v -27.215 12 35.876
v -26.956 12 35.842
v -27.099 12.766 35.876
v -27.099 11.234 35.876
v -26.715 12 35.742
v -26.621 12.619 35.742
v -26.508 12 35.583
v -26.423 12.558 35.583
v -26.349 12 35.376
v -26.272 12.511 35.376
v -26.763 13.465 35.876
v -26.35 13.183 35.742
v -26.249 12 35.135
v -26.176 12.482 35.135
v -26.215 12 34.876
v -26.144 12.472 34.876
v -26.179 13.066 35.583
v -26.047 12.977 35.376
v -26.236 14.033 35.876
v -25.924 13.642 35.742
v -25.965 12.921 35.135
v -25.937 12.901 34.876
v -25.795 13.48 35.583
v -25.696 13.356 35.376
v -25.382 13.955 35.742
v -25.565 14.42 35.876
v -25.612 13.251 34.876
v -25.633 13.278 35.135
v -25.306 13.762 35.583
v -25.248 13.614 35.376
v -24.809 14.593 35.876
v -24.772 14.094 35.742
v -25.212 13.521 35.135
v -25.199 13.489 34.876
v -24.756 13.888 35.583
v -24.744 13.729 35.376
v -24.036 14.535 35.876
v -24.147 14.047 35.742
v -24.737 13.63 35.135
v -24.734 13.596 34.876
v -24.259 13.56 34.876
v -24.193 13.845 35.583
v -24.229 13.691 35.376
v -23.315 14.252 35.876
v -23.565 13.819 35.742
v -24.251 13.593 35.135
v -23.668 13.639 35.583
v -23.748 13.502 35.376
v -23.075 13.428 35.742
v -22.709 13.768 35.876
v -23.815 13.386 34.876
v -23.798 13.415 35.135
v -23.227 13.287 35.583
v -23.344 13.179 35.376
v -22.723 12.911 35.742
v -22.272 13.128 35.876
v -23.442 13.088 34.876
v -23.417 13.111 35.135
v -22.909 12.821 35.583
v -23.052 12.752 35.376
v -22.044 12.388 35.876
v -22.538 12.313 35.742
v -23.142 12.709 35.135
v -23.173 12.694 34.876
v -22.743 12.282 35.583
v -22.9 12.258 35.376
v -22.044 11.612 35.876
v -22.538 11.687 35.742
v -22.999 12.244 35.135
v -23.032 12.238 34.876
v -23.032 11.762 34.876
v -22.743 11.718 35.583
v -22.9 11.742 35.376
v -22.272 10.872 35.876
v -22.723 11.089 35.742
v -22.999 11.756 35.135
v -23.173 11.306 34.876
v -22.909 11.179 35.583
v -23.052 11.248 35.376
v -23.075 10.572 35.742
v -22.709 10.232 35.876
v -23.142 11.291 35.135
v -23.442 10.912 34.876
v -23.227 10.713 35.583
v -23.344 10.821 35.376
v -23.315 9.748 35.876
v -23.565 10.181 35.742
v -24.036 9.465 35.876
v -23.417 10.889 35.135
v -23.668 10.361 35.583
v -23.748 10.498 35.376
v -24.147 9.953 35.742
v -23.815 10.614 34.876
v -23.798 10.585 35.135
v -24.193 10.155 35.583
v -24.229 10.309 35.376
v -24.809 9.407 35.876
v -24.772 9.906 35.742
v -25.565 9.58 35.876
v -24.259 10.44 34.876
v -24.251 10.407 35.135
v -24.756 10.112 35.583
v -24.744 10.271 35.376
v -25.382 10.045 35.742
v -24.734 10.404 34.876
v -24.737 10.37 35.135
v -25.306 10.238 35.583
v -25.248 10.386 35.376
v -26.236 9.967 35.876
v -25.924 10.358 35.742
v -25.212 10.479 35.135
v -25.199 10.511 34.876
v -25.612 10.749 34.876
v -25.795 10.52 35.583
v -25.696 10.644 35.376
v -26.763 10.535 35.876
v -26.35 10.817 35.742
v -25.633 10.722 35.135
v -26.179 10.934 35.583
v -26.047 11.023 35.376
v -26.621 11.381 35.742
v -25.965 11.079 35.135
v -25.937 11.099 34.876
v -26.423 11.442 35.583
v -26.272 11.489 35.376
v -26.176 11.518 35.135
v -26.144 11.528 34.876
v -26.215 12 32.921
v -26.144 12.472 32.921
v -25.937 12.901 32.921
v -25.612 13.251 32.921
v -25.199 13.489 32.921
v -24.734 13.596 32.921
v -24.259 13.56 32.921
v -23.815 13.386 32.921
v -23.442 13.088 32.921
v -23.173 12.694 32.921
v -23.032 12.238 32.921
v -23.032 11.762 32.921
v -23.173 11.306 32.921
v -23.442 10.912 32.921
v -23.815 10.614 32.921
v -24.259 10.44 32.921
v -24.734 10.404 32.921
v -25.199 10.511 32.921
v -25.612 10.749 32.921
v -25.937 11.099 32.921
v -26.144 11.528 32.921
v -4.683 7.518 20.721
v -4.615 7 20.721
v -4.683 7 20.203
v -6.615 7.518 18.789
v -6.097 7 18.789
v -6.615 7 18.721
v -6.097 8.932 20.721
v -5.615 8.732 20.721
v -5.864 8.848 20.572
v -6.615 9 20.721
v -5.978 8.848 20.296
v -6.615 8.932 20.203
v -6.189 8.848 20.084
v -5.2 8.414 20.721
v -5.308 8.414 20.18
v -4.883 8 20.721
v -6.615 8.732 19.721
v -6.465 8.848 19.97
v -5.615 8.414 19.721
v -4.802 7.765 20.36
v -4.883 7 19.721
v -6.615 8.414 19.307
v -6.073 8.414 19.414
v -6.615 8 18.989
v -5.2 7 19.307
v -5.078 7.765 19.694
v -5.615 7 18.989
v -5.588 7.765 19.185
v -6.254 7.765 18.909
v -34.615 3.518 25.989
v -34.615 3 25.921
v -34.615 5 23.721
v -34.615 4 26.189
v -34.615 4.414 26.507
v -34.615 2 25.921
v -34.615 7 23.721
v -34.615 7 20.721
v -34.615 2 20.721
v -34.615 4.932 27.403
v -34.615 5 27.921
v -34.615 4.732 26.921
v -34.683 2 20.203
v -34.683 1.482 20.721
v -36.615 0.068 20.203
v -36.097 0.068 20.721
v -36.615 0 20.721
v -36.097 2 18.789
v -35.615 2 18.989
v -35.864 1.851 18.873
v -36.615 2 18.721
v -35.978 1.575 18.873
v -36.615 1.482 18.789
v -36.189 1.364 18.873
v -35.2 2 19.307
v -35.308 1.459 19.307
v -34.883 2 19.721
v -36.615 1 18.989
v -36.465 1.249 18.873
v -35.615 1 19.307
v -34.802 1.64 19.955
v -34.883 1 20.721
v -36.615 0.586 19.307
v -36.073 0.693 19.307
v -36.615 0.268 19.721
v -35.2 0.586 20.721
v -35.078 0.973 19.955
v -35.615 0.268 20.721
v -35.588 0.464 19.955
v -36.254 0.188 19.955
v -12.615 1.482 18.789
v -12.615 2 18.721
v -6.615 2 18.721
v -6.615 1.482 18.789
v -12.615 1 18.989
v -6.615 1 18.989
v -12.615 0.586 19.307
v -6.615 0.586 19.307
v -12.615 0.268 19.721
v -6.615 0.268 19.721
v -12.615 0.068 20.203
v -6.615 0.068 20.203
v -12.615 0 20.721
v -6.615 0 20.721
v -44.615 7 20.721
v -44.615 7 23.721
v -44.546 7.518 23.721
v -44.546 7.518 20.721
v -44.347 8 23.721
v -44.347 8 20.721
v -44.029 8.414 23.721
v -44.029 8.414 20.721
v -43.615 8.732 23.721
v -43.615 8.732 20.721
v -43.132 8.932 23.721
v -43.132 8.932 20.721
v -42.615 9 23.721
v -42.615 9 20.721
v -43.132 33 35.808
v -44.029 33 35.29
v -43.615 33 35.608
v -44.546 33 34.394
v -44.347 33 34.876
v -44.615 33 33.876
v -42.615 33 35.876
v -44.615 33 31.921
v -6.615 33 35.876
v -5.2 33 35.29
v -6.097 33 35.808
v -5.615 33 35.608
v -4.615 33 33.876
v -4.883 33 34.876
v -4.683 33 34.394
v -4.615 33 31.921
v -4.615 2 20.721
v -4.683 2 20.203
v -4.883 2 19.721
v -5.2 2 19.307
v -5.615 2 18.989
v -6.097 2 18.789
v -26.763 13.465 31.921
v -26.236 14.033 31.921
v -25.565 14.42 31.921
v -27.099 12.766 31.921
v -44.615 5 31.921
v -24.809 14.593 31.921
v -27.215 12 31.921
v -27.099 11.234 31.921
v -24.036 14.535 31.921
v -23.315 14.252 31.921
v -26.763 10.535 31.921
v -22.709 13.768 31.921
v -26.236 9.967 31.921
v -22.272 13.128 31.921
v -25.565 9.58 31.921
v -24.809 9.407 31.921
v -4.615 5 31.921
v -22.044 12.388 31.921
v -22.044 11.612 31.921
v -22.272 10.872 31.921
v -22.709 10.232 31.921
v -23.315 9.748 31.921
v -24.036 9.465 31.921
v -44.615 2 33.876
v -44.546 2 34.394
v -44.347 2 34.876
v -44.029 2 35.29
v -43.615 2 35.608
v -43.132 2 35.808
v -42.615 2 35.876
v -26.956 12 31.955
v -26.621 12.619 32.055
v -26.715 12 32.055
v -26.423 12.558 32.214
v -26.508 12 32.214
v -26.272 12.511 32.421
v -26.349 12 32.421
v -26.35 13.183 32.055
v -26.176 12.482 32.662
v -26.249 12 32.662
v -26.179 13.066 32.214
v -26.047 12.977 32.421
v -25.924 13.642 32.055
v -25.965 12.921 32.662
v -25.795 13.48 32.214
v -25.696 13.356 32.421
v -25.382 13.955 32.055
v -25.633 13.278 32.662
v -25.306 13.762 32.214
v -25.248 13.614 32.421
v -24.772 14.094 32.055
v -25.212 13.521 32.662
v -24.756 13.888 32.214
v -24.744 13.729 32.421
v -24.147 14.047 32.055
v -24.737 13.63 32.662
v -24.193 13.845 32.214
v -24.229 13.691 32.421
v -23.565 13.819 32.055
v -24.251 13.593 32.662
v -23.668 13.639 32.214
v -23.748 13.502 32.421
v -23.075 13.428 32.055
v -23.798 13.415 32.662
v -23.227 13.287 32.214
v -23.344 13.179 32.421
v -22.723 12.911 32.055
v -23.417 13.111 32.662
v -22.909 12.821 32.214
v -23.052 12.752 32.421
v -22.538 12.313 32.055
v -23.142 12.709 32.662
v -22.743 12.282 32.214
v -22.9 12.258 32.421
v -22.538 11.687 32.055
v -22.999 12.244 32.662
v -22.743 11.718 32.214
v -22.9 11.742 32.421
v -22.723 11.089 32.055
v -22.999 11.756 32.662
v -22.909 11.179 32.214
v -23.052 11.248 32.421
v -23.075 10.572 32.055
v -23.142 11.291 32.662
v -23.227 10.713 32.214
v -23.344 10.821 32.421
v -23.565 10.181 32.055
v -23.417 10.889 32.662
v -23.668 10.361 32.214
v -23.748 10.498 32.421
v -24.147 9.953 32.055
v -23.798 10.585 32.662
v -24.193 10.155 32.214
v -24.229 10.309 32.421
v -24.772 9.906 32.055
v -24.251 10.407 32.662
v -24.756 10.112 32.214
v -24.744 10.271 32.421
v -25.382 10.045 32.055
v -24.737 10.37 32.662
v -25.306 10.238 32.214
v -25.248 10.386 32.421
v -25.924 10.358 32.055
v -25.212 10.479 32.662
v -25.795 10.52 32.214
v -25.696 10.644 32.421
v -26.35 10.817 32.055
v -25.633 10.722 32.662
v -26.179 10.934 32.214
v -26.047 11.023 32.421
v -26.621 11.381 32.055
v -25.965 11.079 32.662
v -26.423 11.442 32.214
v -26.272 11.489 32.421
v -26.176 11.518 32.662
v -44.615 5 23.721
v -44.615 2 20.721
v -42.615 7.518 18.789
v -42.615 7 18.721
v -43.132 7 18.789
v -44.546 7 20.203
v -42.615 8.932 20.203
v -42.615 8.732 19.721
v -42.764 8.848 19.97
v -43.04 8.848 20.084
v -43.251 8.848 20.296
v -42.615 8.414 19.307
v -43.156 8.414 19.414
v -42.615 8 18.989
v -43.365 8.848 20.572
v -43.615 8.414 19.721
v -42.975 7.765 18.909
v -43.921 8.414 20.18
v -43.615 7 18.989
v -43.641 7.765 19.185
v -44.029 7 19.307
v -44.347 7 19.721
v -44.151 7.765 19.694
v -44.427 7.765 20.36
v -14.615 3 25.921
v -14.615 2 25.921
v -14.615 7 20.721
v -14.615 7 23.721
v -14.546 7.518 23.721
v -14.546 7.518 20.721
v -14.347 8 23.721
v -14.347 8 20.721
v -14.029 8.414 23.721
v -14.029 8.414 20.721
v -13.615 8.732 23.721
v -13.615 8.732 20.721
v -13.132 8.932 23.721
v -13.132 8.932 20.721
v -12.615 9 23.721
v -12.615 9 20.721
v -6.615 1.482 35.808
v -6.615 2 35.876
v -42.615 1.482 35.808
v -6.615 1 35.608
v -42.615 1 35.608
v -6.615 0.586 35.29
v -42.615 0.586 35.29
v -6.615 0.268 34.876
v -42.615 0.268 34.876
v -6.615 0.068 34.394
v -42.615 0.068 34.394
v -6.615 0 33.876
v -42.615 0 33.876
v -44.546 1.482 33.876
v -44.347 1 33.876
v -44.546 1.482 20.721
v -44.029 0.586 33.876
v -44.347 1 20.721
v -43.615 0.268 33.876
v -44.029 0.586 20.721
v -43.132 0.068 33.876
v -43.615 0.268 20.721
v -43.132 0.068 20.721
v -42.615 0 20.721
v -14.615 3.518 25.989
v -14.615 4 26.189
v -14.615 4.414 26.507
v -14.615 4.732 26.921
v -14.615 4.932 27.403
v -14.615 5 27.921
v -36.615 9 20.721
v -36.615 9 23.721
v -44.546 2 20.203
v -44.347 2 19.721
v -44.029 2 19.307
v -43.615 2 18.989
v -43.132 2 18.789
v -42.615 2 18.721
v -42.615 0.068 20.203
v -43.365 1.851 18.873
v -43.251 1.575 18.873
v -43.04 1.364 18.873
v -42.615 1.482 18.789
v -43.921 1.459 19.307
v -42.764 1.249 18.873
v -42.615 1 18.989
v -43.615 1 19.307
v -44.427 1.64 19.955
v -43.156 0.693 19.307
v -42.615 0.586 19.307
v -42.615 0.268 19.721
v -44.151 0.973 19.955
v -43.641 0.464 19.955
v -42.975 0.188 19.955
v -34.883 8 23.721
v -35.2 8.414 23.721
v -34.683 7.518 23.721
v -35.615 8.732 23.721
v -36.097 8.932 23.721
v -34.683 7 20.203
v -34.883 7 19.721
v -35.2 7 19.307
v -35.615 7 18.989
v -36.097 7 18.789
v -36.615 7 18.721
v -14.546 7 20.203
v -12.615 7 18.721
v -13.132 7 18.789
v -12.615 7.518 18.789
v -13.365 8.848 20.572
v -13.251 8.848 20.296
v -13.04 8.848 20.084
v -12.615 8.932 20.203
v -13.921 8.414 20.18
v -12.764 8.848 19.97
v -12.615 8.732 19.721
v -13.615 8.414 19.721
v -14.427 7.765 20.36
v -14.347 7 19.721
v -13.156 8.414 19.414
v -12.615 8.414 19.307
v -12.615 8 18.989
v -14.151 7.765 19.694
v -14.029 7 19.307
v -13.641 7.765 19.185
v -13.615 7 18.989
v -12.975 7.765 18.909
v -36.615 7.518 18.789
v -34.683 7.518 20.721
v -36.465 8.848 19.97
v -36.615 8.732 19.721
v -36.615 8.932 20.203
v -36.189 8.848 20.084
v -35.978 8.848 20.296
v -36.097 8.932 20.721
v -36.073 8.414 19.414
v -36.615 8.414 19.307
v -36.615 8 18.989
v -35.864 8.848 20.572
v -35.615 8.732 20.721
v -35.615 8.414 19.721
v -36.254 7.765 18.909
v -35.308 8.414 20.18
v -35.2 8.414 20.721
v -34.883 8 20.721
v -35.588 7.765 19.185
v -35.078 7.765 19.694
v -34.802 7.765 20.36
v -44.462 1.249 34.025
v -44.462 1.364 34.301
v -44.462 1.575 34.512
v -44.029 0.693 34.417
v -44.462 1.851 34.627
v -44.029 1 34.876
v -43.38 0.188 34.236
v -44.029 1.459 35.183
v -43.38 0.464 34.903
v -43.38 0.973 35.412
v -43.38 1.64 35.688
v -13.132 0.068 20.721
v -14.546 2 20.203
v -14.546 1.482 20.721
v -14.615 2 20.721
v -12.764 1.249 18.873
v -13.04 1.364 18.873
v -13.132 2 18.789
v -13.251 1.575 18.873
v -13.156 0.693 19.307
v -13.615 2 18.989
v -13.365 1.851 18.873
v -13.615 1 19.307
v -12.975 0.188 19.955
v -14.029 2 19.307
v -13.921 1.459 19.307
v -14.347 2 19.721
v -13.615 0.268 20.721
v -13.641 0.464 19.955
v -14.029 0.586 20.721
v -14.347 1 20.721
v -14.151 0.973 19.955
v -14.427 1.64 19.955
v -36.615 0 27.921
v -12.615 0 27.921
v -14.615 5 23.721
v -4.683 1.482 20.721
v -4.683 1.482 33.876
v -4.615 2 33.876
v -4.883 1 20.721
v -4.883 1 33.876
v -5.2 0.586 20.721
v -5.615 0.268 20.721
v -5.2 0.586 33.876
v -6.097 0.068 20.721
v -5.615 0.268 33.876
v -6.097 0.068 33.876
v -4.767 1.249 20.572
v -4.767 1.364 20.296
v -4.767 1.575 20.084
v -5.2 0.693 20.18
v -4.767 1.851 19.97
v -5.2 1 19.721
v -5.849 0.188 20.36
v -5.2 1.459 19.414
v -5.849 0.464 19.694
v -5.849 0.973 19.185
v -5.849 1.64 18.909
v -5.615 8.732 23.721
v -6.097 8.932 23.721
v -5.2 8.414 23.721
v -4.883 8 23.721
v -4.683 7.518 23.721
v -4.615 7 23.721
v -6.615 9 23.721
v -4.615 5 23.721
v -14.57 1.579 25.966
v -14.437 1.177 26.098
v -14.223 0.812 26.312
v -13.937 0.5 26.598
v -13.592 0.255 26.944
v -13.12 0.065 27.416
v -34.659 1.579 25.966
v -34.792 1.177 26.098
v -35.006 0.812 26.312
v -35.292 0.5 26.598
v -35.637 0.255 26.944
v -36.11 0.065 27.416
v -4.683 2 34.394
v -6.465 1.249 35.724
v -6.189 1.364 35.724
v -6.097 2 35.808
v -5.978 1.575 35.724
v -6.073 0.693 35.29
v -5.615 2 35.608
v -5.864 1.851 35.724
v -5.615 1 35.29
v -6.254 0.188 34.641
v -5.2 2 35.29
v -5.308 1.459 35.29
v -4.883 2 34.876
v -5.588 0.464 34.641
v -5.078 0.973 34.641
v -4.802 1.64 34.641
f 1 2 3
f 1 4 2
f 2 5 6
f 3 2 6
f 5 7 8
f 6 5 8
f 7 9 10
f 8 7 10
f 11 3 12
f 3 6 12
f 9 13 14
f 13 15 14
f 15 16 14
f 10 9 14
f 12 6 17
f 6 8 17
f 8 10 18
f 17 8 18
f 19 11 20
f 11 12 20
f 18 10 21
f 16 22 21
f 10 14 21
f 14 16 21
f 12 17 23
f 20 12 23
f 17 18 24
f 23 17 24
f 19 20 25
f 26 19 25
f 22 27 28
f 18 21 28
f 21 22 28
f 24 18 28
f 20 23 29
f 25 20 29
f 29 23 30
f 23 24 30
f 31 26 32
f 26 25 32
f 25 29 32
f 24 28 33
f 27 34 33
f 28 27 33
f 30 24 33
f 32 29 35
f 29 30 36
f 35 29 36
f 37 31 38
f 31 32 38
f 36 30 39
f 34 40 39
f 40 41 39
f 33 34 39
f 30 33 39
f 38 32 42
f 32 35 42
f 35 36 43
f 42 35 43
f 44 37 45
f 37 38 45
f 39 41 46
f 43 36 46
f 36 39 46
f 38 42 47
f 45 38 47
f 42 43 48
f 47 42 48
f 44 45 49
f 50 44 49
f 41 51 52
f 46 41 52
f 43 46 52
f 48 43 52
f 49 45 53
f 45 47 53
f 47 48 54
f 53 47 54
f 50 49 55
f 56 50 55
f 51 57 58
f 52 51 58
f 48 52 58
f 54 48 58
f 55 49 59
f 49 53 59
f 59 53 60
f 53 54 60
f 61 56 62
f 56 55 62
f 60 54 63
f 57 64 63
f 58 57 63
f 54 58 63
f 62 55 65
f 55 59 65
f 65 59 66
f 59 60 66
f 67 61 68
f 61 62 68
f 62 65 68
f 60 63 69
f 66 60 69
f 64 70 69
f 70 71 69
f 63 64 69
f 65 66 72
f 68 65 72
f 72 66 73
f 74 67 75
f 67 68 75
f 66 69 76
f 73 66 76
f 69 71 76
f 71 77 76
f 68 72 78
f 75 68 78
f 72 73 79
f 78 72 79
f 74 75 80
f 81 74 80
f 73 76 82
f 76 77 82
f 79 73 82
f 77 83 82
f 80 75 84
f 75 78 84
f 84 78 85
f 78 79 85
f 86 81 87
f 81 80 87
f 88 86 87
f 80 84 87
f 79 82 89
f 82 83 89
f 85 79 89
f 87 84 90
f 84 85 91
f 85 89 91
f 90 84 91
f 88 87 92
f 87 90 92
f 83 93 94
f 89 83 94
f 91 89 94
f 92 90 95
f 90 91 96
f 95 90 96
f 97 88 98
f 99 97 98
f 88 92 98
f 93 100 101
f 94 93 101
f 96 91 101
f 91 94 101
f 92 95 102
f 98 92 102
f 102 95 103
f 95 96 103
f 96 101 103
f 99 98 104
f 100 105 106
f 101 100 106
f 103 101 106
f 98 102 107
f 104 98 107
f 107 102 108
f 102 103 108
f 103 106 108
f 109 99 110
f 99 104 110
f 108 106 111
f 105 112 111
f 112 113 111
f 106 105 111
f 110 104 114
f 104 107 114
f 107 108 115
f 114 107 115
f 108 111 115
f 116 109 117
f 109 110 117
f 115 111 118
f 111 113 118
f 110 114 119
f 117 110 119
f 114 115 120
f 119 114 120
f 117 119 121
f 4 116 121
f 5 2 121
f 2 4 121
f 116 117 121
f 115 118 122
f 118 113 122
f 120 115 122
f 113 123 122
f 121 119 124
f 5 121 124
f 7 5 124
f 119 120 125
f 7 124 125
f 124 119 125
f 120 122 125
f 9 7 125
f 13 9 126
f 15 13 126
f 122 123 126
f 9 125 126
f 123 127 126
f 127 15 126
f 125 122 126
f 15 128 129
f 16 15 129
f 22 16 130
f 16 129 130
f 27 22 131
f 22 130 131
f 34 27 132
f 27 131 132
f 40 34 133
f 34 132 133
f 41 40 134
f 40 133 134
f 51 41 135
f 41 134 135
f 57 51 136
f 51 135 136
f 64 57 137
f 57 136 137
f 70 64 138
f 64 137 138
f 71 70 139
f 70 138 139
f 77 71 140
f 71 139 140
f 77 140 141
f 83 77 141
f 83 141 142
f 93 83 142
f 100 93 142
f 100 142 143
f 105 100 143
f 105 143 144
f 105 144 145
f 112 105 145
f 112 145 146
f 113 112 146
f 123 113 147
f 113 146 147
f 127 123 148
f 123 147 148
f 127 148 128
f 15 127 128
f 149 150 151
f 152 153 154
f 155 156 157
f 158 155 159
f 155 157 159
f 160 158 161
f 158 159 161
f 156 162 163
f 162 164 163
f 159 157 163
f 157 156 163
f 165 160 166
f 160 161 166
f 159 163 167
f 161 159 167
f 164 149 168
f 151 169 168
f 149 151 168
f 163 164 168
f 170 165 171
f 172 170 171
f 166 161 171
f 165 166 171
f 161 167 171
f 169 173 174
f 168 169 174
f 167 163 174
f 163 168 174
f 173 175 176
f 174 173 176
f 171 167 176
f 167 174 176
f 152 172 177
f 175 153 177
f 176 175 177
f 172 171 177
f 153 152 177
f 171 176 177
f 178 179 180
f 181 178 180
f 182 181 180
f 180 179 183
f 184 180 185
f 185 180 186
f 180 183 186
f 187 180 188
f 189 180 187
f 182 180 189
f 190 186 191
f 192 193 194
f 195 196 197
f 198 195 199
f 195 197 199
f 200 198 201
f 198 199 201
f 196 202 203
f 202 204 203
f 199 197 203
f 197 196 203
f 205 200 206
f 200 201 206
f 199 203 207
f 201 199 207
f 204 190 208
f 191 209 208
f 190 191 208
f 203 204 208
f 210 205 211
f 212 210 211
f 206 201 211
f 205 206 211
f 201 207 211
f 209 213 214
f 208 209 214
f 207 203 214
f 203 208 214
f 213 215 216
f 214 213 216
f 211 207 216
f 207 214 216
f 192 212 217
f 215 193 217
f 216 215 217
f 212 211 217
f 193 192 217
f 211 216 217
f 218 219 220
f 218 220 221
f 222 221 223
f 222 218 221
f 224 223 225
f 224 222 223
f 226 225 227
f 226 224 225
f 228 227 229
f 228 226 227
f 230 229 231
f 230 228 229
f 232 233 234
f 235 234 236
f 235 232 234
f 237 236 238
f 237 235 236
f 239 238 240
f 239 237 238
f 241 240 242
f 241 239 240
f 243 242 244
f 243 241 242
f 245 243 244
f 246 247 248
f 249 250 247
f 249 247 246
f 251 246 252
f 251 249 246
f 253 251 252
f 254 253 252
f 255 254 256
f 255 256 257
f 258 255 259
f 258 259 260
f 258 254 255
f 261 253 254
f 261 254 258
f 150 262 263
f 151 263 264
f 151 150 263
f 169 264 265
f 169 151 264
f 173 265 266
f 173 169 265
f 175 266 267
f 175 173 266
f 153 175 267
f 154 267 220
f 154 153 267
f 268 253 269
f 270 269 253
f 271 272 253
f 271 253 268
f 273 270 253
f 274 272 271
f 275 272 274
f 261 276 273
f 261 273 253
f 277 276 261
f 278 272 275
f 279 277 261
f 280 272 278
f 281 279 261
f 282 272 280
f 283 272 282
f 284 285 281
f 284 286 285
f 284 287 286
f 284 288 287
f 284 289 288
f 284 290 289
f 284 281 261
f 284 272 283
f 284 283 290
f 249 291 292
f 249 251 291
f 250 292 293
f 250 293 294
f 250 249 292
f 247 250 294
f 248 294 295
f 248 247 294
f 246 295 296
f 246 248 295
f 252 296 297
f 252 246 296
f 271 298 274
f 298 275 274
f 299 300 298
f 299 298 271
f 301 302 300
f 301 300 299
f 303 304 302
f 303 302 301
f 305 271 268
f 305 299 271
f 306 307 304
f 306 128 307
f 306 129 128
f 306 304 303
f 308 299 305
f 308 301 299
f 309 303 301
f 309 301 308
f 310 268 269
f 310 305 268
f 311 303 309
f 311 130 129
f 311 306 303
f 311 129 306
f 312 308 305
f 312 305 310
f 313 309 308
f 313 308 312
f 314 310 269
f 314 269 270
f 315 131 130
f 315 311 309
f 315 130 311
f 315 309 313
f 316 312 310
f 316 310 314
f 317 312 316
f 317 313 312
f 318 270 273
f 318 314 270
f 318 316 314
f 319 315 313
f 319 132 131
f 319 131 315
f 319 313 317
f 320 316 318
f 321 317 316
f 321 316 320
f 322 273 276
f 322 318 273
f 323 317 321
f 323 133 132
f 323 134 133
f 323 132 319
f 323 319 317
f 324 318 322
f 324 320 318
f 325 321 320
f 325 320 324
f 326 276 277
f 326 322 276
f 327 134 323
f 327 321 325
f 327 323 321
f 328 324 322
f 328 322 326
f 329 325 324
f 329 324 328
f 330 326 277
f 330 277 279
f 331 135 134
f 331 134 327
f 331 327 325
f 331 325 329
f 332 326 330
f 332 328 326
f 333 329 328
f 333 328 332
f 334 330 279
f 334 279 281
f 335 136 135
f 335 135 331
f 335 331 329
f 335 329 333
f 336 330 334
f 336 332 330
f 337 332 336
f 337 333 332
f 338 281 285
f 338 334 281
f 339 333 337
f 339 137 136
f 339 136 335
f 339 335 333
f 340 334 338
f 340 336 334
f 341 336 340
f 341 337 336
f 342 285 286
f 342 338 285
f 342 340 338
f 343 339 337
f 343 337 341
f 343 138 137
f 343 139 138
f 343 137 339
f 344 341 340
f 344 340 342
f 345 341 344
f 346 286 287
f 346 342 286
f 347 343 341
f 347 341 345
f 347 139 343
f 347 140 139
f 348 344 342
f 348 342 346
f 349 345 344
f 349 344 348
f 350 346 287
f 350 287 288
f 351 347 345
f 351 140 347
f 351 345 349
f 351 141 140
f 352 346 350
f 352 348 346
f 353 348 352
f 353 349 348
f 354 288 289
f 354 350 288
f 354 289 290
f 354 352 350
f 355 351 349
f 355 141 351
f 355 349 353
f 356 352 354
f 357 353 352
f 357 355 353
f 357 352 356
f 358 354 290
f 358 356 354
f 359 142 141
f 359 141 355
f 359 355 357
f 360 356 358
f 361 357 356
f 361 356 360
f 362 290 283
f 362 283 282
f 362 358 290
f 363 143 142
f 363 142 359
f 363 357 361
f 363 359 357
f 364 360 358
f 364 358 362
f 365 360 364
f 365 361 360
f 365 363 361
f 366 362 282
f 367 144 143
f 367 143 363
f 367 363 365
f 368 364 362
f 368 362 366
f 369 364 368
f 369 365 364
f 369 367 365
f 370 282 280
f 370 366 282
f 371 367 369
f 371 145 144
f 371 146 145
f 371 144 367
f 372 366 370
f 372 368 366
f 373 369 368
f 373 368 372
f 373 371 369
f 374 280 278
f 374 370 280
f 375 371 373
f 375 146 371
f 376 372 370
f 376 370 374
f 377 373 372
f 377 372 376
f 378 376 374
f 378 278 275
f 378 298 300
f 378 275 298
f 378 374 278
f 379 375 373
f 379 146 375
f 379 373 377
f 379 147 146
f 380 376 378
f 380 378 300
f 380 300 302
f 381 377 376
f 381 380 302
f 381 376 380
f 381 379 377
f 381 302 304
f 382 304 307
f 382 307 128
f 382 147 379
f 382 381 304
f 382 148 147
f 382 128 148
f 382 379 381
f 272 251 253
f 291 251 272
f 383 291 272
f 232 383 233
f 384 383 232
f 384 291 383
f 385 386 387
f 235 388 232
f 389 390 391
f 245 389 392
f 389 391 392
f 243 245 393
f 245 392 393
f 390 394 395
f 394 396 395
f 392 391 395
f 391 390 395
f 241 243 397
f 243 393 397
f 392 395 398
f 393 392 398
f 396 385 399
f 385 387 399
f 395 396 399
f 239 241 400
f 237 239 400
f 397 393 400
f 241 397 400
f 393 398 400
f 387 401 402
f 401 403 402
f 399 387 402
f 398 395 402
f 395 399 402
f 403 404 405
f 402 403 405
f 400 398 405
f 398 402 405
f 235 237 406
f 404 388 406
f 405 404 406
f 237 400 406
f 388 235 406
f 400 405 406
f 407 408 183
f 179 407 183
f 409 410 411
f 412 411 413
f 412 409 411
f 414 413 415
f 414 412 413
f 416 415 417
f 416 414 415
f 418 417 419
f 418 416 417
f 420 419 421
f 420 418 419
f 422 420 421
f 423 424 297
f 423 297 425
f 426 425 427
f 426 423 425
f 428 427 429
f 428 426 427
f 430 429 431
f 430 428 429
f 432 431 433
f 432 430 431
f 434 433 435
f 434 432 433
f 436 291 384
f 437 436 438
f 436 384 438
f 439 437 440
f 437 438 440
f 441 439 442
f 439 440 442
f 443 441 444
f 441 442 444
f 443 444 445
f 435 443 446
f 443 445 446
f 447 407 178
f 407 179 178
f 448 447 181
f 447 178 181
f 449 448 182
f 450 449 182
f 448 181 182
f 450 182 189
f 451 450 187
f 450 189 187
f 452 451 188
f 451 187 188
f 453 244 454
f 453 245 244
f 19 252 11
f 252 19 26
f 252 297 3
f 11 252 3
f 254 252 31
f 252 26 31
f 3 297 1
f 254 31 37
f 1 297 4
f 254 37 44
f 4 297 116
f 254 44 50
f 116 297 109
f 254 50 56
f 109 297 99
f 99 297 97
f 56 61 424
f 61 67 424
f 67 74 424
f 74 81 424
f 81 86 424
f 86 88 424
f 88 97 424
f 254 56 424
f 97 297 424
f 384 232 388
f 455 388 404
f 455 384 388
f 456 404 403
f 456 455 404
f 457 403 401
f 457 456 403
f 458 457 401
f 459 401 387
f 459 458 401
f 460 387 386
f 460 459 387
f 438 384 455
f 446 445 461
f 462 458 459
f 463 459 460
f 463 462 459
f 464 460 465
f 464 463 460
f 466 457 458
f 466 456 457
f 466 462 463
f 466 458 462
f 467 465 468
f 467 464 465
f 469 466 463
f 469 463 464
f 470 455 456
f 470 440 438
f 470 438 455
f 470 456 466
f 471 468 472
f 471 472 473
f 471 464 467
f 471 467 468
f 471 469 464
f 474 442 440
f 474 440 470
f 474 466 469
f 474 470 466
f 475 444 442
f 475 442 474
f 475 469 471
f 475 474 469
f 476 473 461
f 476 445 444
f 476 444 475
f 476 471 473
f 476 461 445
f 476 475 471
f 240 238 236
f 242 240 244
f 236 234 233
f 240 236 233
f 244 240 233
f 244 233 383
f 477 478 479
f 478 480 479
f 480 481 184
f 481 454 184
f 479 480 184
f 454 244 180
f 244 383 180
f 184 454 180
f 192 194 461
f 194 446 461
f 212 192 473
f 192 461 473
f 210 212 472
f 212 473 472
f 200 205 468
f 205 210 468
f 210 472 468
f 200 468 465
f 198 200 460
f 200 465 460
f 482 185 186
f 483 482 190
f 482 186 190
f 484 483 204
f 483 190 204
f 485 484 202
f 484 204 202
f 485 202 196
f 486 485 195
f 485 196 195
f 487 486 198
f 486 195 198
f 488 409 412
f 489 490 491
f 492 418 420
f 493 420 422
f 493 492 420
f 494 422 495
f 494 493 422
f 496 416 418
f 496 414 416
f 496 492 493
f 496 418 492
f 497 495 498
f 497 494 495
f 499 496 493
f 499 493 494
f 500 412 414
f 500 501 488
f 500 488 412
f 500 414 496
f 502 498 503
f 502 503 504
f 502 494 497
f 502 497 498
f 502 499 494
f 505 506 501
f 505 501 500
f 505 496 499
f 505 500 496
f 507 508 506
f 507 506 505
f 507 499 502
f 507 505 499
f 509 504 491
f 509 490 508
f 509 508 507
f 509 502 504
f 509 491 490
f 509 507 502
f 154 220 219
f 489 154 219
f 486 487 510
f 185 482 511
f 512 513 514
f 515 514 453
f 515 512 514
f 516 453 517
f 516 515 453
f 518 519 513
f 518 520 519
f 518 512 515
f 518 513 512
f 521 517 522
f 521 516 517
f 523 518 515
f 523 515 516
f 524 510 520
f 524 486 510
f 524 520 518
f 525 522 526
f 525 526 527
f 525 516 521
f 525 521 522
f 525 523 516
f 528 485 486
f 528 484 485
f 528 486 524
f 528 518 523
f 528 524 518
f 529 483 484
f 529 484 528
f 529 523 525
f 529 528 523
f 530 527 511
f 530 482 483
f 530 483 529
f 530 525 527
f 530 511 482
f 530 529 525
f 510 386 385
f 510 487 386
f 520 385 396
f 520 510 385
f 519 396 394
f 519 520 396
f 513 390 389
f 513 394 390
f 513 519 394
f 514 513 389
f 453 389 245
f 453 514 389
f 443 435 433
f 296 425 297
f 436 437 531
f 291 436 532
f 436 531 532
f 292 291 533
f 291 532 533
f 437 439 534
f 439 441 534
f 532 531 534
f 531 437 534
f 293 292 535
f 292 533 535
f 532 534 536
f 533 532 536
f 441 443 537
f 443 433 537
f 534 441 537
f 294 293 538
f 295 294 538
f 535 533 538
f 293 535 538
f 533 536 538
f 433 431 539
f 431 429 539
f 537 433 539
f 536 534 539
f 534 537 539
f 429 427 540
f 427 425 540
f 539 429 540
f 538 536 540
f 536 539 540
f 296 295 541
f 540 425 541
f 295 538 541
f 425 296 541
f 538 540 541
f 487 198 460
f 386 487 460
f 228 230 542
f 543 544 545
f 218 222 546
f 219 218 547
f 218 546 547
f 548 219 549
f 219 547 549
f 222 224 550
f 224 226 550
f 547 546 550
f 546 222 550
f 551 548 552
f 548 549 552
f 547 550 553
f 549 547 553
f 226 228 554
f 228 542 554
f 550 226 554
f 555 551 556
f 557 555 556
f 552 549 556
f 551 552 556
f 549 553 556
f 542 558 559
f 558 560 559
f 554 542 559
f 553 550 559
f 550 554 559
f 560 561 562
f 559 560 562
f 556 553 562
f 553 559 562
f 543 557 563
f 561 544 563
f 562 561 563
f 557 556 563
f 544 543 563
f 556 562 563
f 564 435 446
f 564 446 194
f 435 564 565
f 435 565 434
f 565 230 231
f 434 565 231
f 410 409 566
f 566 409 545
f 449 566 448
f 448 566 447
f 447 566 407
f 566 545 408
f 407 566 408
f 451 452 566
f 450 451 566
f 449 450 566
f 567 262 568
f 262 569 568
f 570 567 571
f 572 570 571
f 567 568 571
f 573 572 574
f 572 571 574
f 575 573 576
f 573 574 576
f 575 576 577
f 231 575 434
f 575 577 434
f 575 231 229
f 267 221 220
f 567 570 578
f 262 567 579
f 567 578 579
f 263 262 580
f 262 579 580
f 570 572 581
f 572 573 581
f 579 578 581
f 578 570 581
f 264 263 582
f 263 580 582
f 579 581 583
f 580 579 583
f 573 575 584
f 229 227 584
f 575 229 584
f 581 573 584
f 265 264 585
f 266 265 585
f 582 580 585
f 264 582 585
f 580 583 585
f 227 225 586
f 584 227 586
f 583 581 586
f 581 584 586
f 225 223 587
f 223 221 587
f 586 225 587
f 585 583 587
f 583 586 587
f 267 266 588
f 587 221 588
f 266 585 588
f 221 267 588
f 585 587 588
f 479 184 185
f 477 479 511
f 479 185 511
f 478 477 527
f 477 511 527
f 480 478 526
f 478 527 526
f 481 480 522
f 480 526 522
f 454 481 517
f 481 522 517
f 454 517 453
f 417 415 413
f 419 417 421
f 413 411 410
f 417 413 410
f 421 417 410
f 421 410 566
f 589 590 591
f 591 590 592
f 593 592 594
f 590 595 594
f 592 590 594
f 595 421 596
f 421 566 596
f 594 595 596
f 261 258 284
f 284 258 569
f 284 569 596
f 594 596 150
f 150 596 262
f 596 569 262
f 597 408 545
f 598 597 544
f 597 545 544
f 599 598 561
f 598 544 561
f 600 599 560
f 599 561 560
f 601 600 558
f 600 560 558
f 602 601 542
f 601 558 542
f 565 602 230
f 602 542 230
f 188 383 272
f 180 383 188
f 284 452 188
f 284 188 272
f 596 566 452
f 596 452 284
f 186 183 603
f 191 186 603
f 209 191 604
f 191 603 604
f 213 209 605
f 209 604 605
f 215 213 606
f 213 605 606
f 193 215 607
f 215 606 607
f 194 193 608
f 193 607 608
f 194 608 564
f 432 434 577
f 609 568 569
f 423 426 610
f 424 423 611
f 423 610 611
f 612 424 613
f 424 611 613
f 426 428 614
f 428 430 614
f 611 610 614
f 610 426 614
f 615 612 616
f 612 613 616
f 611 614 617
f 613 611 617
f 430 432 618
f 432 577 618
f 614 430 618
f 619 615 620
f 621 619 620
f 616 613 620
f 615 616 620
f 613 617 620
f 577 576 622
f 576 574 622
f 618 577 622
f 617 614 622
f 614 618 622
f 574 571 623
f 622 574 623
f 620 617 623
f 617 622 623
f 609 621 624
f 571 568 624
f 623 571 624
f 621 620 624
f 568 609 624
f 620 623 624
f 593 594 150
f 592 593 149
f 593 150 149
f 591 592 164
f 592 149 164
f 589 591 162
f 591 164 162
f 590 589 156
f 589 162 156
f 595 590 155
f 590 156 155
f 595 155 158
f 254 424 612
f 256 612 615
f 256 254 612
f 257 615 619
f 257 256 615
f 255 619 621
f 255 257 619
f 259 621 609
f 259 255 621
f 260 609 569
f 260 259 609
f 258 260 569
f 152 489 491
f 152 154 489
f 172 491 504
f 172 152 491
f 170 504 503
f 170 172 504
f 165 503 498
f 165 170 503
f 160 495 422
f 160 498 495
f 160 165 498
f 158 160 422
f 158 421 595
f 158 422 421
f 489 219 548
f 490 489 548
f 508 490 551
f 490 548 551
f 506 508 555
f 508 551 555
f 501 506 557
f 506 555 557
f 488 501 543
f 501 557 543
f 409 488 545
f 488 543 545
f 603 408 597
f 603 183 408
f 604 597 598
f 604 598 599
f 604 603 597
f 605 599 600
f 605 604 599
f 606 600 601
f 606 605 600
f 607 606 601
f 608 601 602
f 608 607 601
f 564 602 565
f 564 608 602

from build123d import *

# Parameters (mm, degrees)
BOSS_EXTRUDE1_DEPTH = 5
SKETCH1_3_W         = 10
SKETCH1_3_H         = 5
BOSS_EXTRUDE2_DEPTH = 9
SKETCH2_W           = 40
SKETCH2_H           = 3.955098896
BOSS_EXTRUDE4_DEPTH = 28
FILLET1_R           = 2
SKETCH6_R           = 1.6
CUT_EXTRUDE1_DEPTH  = 3.955098897
FILLET2_R           = 1


with BuildPart() as part:
    # Sketch1 → Boss-Extrude1 (new body)
    with BuildSketch(Plane(origin=(0, 0, 0), x_dir=(1, 0, 0), z_dir=(0, 1, 0))):
        Polygon((-4.61462686, -18.720861087), (-14.61462686, -18.720861087), (-14.61462686, -25.920861087), (-34.61462686, -25.920861087), (-34.61462686, -18.720861087), (-44.61462686, -18.720861087), (-44.61462686, -35.875959983), (-4.61462686, -35.875959983), align=None)
    extrude(amount=BOSS_EXTRUDE1_DEPTH)

    # Sketch1<3> → Boss-Extrude2 (add)
    with BuildSketch(Plane(origin=(0, 0, 0), x_dir=(1, 0, 0), z_dir=(0, 1, 0))):
        with Locations((-39.61462686, -21.220861087)):
            Rectangle(SKETCH1_3_W, SKETCH1_3_H)
        with Locations((-9.61462686, -21.220861087)):
            Rectangle(SKETCH1_3_W, SKETCH1_3_H)
    extrude(amount=BOSS_EXTRUDE2_DEPTH)

    # Sketch2 → Boss-Extrude4 (add)
    with BuildSketch(Plane(origin=(0, 5, 0), x_dir=(1, 0, 0), z_dir=(0, 1, 0))):
        with Locations((-24.61462686, -33.898410535)):
            Rectangle(SKETCH2_W, SKETCH2_H)
    extrude(amount=BOSS_EXTRUDE4_DEPTH)

    # Fillet1
    fillet1_edges = [part.edges().sort_by_distance(p)[0] for p in [
        (-34.61462686, 0, 22.320861087),
        (-24.61462686, 0, 25.920861087),
        (-14.61462686, 0, 22.320861087),
        (-9.61462686, 0, 18.720861087),
        (-4.61462686, 0, 27.298410535),
        (-24.61462686, 0, 35.875959983),
        (-44.61462686, 0, 27.298410535),
        (-44.61462686, 4.5, 18.720861087),
        (-34.61462686, 4.5, 18.720861087),
        (-14.61462686, 4.5, 18.720861087),
        (-4.61462686, 4.5, 18.720861087),
        (-4.61462686, 16.5, 35.875959983),
        (-44.61462686, 16.5, 35.875959983),
        (-24.61462686, 5, 25.920861087),
        (-39.61462686, 9, 18.720861087),
        (-44.61462686, 9, 21.220861087),
        (-34.61462686, 9, 21.220861087),
        (-14.61462686, 9, 21.220861087),
        (-4.61462686, 9, 21.220861087),
        (-9.61462686, 9, 18.720861087),
        (-39.61462686, 0, 18.720861087),
    ]]
    fillet(fillet1_edges, radius=FILLET1_R)

    # Sketch6 → Cut-Extrude1 (cut)
    with BuildSketch(Plane(origin=(0, 0, 31.920861087), x_dir=(-1, 0, 0), z_dir=(0, 0, -1))):
        with Locations((24.61462686, 12)):
            Circle(SKETCH6_R)
    extrude(amount=-CUT_EXTRUDE1_DEPTH, mode=Mode.SUBTRACT)

    # Fillet2
    fillet2_edges = [part.edges().sort_by_distance(p)[0] for p in [
        (-23.01462686, 12, 31.920861087),
        (-23.01462686, 12, 35.875959984),
    ]]
    fillet(fillet2_edges, radius=FILLET2_R)


solid = part.part
